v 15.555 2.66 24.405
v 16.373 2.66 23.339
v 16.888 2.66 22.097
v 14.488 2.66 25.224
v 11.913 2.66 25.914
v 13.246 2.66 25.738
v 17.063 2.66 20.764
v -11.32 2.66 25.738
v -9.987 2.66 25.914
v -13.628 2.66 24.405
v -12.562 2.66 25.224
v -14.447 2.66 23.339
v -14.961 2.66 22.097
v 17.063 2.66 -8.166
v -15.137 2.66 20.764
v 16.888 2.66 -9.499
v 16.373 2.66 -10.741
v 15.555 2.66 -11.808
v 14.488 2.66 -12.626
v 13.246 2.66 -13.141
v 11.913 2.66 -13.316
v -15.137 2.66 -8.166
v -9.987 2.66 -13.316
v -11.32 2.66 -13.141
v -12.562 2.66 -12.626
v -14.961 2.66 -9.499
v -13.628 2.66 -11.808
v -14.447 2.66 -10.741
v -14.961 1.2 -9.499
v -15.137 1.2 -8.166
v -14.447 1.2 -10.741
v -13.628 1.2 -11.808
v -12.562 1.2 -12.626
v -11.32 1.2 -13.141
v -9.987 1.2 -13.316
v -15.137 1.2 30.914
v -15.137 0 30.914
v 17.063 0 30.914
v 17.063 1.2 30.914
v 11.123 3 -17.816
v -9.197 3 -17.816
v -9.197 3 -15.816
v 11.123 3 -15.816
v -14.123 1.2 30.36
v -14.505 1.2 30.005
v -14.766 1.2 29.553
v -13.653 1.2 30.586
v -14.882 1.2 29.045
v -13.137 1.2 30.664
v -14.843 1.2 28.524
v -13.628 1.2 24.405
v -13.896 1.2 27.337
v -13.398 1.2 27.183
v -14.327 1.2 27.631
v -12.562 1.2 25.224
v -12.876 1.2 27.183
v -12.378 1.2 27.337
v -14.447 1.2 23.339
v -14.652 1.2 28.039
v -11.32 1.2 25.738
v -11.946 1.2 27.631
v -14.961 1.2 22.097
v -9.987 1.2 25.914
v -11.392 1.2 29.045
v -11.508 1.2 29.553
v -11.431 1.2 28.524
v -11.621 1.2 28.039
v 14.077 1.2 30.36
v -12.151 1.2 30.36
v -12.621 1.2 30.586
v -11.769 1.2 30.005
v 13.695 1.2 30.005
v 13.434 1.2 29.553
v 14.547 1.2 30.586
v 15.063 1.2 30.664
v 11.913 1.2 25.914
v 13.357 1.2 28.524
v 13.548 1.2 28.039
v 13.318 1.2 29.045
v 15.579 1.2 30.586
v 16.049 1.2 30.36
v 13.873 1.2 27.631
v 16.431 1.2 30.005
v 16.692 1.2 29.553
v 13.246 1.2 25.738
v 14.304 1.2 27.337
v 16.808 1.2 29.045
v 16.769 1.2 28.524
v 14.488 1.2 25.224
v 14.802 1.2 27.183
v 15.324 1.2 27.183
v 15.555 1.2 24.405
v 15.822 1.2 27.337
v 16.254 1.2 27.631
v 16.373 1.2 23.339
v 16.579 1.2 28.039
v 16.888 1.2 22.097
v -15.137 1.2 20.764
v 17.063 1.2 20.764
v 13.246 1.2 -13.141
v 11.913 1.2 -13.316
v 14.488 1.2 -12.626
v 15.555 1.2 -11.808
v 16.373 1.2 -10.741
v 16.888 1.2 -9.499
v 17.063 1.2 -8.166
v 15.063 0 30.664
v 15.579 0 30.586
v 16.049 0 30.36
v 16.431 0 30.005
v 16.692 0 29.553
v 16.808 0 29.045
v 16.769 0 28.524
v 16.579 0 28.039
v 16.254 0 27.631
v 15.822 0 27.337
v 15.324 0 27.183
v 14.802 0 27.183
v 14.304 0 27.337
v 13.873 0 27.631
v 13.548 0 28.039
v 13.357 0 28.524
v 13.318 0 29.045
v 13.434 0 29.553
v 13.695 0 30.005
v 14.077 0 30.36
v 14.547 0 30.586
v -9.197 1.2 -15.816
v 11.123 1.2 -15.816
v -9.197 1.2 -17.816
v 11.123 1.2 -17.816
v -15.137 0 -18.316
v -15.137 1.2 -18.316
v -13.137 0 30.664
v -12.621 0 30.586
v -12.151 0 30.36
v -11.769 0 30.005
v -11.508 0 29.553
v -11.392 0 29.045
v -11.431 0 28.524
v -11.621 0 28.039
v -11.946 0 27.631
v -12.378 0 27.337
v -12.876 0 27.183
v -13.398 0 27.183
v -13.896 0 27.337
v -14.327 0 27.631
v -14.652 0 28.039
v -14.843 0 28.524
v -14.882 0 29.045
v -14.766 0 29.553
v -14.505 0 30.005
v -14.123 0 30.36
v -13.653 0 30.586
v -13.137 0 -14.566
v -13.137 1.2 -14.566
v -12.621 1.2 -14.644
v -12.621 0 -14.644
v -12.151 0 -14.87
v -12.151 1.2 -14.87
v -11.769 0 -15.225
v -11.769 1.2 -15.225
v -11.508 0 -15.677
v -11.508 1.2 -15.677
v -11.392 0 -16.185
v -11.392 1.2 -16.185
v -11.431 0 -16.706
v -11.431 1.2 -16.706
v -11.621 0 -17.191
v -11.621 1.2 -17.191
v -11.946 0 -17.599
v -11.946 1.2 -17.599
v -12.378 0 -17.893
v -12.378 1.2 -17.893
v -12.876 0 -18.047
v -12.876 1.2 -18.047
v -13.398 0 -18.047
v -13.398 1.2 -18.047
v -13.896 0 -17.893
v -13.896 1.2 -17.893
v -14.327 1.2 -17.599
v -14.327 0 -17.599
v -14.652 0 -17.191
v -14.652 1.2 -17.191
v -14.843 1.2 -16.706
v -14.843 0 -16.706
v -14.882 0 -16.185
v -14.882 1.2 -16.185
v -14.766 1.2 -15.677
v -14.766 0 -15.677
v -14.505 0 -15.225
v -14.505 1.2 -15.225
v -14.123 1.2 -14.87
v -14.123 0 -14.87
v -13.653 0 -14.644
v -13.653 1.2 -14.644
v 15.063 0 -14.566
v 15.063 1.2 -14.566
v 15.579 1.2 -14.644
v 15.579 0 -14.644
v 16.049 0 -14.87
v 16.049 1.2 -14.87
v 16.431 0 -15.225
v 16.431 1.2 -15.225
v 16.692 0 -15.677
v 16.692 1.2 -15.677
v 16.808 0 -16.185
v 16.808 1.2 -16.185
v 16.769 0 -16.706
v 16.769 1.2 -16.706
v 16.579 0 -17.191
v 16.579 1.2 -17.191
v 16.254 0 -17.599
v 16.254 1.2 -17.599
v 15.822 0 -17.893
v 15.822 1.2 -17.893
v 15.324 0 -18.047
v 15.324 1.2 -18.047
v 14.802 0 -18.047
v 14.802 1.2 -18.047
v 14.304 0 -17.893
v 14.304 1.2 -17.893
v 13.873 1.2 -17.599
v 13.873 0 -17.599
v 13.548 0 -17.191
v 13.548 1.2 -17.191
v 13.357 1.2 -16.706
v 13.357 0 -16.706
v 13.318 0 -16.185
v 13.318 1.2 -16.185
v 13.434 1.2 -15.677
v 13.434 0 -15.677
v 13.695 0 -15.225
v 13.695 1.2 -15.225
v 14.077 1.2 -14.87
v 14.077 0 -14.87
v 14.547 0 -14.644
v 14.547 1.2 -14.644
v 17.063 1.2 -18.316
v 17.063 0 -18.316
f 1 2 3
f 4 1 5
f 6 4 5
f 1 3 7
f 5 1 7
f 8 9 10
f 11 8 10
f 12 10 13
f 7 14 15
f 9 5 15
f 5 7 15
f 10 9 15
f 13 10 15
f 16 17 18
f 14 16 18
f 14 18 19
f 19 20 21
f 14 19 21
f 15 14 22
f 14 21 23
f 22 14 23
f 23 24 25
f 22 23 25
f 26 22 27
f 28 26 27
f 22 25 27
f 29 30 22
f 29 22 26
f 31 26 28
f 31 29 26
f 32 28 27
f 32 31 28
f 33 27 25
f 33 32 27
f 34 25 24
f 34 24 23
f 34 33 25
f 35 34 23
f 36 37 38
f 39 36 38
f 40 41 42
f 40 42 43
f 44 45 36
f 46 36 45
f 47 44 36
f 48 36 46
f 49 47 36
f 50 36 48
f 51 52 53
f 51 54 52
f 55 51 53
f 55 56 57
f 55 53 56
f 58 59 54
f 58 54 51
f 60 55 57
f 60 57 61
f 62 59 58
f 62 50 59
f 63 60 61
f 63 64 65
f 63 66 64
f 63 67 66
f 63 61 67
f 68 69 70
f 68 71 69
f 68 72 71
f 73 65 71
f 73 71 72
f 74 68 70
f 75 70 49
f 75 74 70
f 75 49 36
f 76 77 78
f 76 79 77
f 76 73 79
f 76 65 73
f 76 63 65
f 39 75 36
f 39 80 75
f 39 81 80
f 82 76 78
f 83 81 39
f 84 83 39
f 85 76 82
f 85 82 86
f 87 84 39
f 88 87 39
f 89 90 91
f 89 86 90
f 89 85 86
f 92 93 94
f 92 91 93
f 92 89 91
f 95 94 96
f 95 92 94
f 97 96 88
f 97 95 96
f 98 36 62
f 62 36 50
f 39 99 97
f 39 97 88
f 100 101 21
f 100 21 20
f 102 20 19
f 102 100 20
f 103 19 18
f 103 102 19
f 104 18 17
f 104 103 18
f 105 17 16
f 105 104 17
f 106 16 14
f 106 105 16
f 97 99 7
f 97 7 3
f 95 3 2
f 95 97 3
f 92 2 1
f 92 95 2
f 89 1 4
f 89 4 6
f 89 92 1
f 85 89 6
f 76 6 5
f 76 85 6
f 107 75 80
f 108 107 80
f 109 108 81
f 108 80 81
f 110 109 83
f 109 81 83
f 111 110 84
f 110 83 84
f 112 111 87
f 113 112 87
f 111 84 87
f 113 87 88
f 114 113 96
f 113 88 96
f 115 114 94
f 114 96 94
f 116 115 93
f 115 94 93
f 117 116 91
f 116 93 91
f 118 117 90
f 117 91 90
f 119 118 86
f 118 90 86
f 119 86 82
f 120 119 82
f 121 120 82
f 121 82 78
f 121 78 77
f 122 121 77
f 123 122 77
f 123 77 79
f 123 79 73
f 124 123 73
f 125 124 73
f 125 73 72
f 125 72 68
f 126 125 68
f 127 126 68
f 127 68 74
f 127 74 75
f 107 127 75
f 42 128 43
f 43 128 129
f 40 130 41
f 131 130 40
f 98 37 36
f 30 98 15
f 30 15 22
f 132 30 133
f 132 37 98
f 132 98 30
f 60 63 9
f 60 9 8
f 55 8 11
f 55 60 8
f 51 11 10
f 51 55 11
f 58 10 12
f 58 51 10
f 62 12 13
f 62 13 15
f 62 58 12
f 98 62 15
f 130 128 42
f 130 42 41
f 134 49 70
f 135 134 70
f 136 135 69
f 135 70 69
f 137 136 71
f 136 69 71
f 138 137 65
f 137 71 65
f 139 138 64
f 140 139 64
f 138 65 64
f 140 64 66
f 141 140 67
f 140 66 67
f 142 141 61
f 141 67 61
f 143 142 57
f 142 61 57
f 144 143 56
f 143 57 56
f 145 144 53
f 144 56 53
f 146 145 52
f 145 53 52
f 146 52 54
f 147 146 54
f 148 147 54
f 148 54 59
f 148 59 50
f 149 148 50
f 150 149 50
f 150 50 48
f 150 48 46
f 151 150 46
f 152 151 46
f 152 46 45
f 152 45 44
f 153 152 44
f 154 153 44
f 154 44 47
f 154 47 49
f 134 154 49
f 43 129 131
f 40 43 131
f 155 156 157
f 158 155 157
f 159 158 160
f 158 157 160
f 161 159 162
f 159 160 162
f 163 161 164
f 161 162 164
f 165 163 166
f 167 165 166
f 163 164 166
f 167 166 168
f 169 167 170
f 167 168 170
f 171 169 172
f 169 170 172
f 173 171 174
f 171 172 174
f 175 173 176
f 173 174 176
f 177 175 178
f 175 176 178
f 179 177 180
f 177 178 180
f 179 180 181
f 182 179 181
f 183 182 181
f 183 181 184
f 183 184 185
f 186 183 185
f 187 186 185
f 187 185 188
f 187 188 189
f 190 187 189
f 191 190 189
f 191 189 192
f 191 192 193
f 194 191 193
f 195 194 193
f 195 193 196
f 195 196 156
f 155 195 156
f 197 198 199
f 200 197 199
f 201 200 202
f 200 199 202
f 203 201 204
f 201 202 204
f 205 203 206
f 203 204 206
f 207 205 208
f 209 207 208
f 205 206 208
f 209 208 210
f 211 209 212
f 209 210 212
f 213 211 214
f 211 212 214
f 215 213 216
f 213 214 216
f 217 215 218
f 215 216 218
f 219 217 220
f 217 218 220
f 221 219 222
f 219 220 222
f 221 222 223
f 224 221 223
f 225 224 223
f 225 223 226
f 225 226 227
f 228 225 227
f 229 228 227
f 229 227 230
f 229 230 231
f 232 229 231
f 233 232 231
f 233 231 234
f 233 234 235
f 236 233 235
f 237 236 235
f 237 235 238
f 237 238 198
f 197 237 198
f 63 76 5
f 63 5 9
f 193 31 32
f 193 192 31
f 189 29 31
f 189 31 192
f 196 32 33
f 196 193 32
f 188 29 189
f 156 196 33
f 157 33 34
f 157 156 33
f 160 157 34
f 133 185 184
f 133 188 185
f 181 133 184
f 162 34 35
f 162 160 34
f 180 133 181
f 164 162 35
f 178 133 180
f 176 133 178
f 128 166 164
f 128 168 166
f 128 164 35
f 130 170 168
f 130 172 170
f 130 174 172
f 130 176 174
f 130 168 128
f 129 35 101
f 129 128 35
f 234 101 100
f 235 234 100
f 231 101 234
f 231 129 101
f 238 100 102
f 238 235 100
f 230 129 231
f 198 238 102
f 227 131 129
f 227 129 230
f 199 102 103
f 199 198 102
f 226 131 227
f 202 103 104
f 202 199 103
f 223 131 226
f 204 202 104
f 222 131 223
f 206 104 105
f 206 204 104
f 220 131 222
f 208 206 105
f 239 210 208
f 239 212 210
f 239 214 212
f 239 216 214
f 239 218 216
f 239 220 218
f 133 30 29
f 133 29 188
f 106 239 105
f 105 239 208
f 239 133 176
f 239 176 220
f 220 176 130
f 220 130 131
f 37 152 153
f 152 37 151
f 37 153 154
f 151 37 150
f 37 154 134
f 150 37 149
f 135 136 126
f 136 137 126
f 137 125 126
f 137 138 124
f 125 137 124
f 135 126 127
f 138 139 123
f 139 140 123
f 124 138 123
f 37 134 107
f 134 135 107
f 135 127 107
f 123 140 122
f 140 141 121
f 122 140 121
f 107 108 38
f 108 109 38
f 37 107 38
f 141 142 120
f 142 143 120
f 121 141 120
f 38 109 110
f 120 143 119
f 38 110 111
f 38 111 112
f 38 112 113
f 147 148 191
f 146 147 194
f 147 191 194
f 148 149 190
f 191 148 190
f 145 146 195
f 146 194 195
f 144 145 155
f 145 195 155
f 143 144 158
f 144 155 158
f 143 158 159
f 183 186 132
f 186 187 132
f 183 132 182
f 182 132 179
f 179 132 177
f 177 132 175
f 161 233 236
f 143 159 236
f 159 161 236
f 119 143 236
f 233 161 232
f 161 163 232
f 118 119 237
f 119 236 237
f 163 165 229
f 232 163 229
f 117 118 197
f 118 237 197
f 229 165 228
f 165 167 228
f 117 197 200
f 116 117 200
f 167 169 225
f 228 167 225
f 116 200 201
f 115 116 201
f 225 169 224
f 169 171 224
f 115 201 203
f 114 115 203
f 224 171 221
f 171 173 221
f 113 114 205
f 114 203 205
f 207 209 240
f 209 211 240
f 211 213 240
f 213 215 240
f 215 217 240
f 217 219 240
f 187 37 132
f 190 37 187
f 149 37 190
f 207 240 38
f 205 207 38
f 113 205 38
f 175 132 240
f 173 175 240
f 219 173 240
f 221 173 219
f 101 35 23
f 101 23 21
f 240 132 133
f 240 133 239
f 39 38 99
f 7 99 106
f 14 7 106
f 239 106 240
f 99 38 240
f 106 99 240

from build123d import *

# Parameters (mm, degrees)
SKETCH_1_W          = 32.2
SKETCH_1_H          = 49.23
EXTRUDE_1_DEPTH     = 1.2
SKETCH_2_W          = 20.32
SKETCH_2_H          = 2
EXTRUDE_2_DEPTH     = 1.8
SKETCH_2_3_R        = 1.75
CUT_EXTRUDE_1_DEPTH = 1.8
EXTRUDE_3_DEPTH     = 1.46


with BuildPart() as part:
    # 草图1 → 凸台-拉伸1 (new body)
    with BuildSketch(Plane(origin=(0, 0, 0), x_dir=(1, 0, 0), z_dir=(0, 1, 0))):
        with Locations((0.963198928, -6.298805668)):
            Rectangle(SKETCH_1_W, SKETCH_1_H)
    extrude(amount=EXTRUDE_1_DEPTH)

    # 草图2 → 凸台-拉伸2 (add)
    with BuildSketch(Plane(origin=(0, 1.2, 0), x_dir=(1, 0, 0), z_dir=(0, 1, 0))):
        with Locations((0.963198928, 16.816194332)):
            Rectangle(SKETCH_2_W, SKETCH_2_H)
    extrude(amount=EXTRUDE_2_DEPTH)

    # 草图2<3> → 切除-拉伸1 (cut)
    with BuildSketch(Plane(origin=(0, 1.2, 0), x_dir=(1, 0, 0), z_dir=(0, 1, 0))):
        with Locations((-13.136801072, 16.316194332)):
            Circle(SKETCH_2_3_R)
        with Locations((15.063198928, 16.316194332)):
            Circle(SKETCH_2_3_R)
        with Locations((-13.136801072, -28.913805668)):
            Circle(SKETCH_2_3_R)
        with Locations((15.063198928, -28.913805668)):
            Circle(SKETCH_2_3_R)
    extrude(amount=-CUT_EXTRUDE_1_DEPTH, mode=Mode.SUBTRACT)

    # 草图3 → 凸台-拉伸3 (add)
    with BuildSketch(Plane(origin=(0, 1.2, 0), x_dir=(1, 0, 0), z_dir=(0, 1, 0))):
        with BuildLine():
            Line((-9.986801072, 13.316194332), (11.913198928, 13.316194332))
            ThreePointArc((11.913198928, 13.316194332), (15.554798851, 11.807794255), (17.063198928, 8.166194332))
            Line((17.063198928, 8.166194332), (17.063198928, -20.763805668))
            ThreePointArc((17.063198928, -20.763805668), (15.554798851, -24.405405591), (11.913198928, -25.913805668))
            Line((11.913198928, -25.913805668), (-9.986801072, -25.913805668))
            ThreePointArc((-9.986801072, -25.913805668), (-13.628400995, -24.405405591), (-15.136801072, -20.763805668))
            Line((-15.136801072, -20.763805668), (-15.136801072, 8.166194332))
            ThreePointArc((-15.136801072, 8.166194332), (-13.628400995, 11.807794255), (-9.986801072, 13.316194332))
        make_face()
    extrude(amount=EXTRUDE_3_DEPTH)


solid = part.part
